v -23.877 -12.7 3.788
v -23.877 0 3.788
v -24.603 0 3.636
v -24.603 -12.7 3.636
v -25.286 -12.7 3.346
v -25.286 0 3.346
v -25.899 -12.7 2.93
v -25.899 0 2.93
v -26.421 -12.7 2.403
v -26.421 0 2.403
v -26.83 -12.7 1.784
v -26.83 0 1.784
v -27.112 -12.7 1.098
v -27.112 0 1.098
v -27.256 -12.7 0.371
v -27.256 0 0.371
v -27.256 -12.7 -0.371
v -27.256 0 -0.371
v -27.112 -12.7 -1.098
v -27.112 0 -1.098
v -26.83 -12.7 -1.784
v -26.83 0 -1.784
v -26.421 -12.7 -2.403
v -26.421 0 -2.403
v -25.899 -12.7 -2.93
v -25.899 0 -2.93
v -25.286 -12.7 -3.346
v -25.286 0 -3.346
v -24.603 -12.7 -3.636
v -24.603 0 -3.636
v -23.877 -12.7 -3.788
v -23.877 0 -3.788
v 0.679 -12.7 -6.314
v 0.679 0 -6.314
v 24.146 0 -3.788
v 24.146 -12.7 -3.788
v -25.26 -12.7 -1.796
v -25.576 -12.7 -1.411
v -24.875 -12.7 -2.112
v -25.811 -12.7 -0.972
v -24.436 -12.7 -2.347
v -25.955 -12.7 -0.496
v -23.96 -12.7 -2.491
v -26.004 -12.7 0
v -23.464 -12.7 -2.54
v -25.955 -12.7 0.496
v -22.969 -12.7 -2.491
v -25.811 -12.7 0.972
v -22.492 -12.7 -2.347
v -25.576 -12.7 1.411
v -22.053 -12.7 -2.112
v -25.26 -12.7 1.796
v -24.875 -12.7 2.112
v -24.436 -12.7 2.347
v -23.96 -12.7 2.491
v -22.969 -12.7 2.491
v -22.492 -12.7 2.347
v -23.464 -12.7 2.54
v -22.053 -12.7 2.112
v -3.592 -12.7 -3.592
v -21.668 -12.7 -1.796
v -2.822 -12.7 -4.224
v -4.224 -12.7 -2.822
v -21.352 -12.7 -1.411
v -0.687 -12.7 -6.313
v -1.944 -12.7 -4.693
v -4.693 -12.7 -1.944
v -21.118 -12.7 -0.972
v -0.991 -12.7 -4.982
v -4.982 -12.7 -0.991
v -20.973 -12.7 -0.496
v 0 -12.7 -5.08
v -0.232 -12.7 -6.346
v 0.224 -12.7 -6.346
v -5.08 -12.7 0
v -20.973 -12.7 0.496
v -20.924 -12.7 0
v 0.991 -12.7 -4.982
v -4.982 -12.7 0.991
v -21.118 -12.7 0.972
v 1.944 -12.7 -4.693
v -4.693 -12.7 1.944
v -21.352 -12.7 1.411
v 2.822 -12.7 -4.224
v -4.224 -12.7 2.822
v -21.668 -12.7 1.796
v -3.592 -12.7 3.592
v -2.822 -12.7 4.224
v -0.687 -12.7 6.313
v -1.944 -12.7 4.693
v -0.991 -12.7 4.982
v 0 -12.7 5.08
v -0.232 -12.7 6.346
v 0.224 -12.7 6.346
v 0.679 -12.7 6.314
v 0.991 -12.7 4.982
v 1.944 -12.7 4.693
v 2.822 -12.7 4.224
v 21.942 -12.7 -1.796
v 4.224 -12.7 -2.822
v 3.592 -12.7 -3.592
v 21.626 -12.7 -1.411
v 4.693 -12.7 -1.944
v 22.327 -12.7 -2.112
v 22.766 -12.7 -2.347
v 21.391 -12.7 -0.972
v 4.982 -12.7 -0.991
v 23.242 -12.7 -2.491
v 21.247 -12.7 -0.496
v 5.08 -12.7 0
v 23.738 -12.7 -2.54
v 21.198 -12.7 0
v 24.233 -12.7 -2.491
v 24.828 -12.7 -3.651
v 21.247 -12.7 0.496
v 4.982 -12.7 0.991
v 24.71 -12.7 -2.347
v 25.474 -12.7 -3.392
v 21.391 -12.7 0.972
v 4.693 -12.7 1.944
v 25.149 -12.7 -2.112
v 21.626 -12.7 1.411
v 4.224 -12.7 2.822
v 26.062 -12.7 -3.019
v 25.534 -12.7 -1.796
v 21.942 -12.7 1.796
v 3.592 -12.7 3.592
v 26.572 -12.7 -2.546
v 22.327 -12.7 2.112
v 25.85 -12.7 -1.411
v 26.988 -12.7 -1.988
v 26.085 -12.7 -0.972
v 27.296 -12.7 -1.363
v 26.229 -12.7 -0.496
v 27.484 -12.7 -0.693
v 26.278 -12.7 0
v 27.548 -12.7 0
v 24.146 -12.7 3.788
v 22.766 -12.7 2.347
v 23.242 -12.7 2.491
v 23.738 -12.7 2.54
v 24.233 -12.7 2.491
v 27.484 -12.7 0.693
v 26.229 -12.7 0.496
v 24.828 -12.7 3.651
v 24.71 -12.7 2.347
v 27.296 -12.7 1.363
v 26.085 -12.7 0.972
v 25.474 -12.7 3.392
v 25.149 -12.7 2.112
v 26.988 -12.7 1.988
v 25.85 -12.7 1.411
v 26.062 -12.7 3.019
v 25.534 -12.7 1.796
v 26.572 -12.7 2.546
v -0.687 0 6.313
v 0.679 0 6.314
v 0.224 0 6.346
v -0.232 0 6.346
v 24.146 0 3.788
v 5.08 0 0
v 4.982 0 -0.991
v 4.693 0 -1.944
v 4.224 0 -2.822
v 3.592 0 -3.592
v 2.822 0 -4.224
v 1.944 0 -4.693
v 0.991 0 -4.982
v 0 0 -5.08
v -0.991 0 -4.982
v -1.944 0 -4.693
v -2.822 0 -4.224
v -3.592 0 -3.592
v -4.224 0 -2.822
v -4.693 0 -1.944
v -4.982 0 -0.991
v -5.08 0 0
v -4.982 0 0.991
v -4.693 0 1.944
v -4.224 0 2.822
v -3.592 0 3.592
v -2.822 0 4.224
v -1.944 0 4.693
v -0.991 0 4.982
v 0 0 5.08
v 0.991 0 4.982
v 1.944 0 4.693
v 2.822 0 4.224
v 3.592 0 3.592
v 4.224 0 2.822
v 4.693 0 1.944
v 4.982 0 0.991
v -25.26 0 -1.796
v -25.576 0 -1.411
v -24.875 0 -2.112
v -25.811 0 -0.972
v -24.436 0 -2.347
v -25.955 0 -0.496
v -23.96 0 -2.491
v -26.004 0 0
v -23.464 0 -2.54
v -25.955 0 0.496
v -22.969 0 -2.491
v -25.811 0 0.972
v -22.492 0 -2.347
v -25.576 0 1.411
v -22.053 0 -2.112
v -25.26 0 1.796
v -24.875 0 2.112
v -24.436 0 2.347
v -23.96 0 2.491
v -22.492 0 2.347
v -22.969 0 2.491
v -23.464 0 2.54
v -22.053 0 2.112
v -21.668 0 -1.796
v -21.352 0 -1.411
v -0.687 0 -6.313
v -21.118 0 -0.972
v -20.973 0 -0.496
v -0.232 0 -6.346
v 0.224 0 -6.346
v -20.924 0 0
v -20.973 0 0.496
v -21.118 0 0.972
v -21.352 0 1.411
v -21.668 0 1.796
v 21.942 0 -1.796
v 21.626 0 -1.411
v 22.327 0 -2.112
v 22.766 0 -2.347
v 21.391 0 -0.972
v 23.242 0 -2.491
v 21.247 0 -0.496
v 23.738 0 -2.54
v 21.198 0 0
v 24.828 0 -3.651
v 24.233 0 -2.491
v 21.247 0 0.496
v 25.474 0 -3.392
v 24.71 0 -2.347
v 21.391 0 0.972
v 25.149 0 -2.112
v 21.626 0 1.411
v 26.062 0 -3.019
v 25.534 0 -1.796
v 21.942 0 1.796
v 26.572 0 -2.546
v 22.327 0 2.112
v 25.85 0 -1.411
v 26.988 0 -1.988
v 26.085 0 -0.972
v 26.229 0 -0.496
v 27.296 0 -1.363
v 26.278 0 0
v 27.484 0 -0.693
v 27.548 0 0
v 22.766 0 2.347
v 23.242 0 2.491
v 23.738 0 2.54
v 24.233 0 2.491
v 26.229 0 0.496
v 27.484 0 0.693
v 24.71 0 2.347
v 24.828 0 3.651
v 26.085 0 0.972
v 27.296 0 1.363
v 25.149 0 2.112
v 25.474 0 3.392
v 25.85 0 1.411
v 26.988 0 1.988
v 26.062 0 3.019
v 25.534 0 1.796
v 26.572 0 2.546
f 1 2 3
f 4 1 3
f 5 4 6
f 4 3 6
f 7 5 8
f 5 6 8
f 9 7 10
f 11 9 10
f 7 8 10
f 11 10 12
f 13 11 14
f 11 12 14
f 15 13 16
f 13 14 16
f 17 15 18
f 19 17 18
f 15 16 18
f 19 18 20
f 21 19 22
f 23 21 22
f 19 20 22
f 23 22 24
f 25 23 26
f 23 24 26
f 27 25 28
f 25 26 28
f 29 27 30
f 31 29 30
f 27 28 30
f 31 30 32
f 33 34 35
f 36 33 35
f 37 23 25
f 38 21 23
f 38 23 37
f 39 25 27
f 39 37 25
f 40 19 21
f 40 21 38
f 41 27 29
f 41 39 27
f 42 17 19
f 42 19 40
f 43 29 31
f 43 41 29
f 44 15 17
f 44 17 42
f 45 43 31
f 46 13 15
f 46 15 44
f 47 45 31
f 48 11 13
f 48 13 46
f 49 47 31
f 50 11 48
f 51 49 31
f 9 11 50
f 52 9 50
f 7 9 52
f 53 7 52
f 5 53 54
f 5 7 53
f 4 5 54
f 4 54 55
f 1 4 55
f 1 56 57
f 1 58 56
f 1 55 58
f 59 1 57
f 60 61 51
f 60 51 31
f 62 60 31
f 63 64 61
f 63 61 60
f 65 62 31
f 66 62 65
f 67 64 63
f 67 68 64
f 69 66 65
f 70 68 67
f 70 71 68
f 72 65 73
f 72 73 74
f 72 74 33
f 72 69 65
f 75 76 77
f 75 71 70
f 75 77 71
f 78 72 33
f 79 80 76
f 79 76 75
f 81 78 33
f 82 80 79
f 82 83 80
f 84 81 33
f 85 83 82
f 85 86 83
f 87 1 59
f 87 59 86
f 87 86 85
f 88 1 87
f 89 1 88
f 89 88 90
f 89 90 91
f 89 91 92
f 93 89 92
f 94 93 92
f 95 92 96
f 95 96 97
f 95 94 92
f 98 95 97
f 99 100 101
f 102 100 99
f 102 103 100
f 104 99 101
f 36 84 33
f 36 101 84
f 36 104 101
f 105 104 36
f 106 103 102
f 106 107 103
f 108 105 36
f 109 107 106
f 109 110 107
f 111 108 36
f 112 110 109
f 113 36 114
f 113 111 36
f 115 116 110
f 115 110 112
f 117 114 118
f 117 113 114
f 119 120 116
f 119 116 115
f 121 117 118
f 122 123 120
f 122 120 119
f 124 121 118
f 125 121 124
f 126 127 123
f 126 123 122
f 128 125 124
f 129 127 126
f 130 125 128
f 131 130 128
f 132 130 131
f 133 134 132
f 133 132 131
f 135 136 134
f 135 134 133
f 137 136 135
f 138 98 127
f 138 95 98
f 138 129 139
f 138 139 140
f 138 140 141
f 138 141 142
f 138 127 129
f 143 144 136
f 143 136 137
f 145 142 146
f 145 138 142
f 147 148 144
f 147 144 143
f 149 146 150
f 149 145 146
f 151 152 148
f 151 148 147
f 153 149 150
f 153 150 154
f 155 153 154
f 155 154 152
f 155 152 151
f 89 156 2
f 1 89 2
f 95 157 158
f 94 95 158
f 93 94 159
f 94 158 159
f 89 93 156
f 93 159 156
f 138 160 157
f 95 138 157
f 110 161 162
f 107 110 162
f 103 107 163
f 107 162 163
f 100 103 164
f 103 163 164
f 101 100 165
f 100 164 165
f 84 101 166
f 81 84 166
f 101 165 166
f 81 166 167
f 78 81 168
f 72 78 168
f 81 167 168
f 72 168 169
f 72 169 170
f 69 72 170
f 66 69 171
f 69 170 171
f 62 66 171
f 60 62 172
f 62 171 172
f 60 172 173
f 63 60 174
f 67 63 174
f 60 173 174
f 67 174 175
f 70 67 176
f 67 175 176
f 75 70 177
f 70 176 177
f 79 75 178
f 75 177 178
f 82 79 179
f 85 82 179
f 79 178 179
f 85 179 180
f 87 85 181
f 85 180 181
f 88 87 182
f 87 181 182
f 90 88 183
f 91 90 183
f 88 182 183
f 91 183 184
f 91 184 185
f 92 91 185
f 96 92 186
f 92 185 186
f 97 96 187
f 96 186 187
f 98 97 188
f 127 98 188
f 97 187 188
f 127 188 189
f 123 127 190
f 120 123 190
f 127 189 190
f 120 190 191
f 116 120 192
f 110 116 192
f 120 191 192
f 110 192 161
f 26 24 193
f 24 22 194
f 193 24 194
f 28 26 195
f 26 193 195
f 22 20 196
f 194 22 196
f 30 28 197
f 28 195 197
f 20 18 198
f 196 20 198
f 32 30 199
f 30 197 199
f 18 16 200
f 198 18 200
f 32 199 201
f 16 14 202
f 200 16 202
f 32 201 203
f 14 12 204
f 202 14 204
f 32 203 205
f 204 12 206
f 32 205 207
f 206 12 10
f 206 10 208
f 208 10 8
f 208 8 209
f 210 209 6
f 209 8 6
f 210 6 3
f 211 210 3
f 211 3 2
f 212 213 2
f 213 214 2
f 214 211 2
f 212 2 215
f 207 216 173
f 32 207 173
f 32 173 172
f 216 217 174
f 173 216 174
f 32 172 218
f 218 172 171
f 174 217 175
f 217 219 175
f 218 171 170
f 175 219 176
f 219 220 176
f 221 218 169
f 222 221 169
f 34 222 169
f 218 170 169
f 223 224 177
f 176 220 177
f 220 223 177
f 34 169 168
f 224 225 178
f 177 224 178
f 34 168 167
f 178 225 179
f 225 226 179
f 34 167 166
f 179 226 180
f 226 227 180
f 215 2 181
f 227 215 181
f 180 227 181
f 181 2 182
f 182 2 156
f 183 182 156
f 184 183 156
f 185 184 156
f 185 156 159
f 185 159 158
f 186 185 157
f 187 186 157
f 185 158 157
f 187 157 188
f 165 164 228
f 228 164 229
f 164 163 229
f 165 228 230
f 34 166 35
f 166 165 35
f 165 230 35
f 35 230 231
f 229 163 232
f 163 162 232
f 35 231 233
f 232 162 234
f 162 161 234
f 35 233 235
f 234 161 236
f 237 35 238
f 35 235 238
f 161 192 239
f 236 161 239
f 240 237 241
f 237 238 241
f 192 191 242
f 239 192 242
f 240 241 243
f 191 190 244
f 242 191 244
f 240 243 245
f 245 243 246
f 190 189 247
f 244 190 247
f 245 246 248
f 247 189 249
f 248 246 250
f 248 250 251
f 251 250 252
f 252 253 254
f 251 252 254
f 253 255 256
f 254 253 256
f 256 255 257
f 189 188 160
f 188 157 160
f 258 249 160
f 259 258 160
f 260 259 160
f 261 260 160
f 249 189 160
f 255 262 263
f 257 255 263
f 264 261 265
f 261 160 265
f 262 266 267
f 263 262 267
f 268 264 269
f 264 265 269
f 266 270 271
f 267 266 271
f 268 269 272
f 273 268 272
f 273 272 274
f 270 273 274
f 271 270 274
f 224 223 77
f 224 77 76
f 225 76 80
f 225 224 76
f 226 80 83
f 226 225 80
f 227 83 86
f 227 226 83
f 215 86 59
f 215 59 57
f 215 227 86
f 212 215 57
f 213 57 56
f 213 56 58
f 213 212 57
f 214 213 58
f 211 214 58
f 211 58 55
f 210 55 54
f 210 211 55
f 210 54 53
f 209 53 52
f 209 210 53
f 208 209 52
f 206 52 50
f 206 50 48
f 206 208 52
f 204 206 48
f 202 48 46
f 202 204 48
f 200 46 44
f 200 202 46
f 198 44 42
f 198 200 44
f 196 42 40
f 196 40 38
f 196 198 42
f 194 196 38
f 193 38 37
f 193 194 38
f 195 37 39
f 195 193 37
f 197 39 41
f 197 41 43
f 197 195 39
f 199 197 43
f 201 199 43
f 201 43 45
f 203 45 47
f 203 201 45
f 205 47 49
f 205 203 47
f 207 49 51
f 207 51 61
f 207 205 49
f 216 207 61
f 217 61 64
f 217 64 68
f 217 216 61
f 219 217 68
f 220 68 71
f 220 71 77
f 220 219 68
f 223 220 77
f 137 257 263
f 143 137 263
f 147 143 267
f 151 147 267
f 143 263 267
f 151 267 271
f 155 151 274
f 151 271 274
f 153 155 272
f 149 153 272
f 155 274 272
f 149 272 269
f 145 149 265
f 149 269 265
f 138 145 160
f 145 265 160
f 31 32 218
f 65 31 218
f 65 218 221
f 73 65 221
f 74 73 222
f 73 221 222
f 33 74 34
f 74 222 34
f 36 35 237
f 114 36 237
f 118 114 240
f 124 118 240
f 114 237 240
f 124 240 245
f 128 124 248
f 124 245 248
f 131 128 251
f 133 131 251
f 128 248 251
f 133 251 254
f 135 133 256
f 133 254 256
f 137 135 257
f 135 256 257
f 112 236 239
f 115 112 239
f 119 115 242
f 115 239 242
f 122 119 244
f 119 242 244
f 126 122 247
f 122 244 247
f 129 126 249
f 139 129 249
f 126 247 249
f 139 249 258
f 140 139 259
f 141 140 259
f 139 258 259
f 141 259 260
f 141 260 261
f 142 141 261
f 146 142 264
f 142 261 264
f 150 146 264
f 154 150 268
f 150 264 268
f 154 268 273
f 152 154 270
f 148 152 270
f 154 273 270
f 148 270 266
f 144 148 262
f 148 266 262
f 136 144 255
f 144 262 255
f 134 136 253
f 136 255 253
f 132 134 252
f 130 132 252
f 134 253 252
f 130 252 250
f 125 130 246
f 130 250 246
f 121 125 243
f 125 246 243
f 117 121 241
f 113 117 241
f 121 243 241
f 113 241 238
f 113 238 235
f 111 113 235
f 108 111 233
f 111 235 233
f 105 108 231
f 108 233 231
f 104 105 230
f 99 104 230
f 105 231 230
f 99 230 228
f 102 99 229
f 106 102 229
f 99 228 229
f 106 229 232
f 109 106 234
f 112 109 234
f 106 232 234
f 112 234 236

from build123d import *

# Parameters (mm, degrees)
F0_R     = 2.54
F1_DEPTH = 12.7


with BuildPart() as f1:
    # F0 (on Front) → F1 (new body)
    with BuildSketch(Plane.XZ):
        with BuildLine():
            ThreePointArc((-23.876614939, 3.7876112691), (-20.9200976778, 2.836147849), (-19.6541820669, 0))
            Line((-19.6541820669, 0), (-6.35, 0))
            ThreePointArc((-6.35, 0), (-4.7269130816, 4.2401406485), (-0.6873881201, 6.3126854486))
            Line((-0.6873881201, 6.3126854486), (-23.876614939, 3.7876112691))
        make_face()
        with BuildLine():
            Line((-6.35, 0), (-19.6541820669, 0))
            ThreePointArc((-19.6541820669, 0), (-20.9200976778, -2.836147849), (-23.876614939, -3.7876112691))
            Line((-23.876614939, -3.7876112691), (-0.6873881201, -6.3126854486))
            ThreePointArc((-0.6873881201, -6.3126854486), (-4.7269130816, -4.2401406485), (-6.35, 0))
        make_face()
        with BuildLine():
            Line((24.1456229767, 3.7881261824), (0.6794606235, 6.3135436374))
            ThreePointArc((0.6794606235, 6.3135436374), (4.7242499383, 4.2431076489), (6.35, 0))
            Line((6.35, 0), (19.9279466026, 0))
            ThreePointArc((19.9279466026, 0), (21.1920820133, 2.834549963), (24.1456229767, 3.7881261824))
        make_face()
        with BuildLine():
            ThreePointArc((6.35, 0), (4.7242499383, -4.2431076489), (0.6794606235, -6.3135436374))
            Line((0.6794606235, -6.3135436374), (24.1456229767, -3.7881261824))
            ThreePointArc((24.1456229767, -3.7881261824), (21.1920820133, -2.834549963), (19.9279466026, 0))
            Line((19.9279466026, 0), (6.35, 0))
        make_face()
        with BuildLine():
            ThreePointArc((27.5479466026, 0), (26.5724965656, 2.5458645893), (24.1456229767, 3.7881261824))
            ThreePointArc((24.1456229767, 3.7881261824), (21.1920820133, 2.834549963), (19.9279466026, 0))
            ThreePointArc((19.9279466026, 0), (21.1920820133, -2.834549963), (24.1456229767, -3.7881261824))
            ThreePointArc((24.1456229767, -3.7881261824), (26.5724965656, -2.5458645893), (27.5479466026, 0))
        make_face()
        with BuildLine():
            ThreePointArc((26.2779466026, 0), (23.7379466026, -2.54), (21.1979466026, 0))
            ThreePointArc((21.1979466026, 0), (23.7379466026, 2.54), (26.2779466026, 0))
        make_face(mode=Mode.SUBTRACT)
        with BuildLine():
            ThreePointArc((-0.6873881201, 6.3126854486), (-4.7269130816, 4.2401406485), (-6.35, 0))
            Line((-6.35, 0), (-5.08, 0))
            ThreePointArc((-5.08, 0), (0, 5.08), (5.08, 0))
            Line((5.08, 0), (6.35, 0))
            ThreePointArc((6.35, 0), (4.7242499383, 4.2431076489), (0.6794606235, 6.3135436374))
            ThreePointArc((0.6794606235, 6.3135436374), (-0.0039869064, 6.3499987484), (-0.6873881201, 6.3126854486))
        make_face()
        with BuildLine():
            Line((-5.08, 0), (-6.35, 0))
            ThreePointArc((-6.35, 0), (-4.7269130816, -4.2401406485), (-0.6873881201, -6.3126854486))
            ThreePointArc((-0.6873881201, -6.3126854486), (-0.0039869064, -6.3499987484), (0.6794606235, -6.3135436374))
            ThreePointArc((0.6794606235, -6.3135436374), (4.7242499383, -4.2431076489), (6.35, 0))
            Line((6.35, 0), (5.08, 0))
            ThreePointArc((5.08, 0), (0, -5.08), (-5.08, 0))
        make_face()
        with BuildLine():
            ThreePointArc((-23.876614939, -3.7876112691), (-20.9200976778, -2.836147849), (-19.6541820669, 0))
            ThreePointArc((-19.6541820669, 0), (-20.9200976778, 2.836147849), (-23.876614939, 3.7876112691))
            ThreePointArc((-23.876614939, 3.7876112691), (-27.2741820669, 0), (-23.876614939, -3.7876112691))
        make_face()
        with Locations((-23.4641820669, 0)):
            Circle(F0_R, mode=Mode.SUBTRACT)
    extrude(amount=F1_DEPTH)


solid = f1.part
